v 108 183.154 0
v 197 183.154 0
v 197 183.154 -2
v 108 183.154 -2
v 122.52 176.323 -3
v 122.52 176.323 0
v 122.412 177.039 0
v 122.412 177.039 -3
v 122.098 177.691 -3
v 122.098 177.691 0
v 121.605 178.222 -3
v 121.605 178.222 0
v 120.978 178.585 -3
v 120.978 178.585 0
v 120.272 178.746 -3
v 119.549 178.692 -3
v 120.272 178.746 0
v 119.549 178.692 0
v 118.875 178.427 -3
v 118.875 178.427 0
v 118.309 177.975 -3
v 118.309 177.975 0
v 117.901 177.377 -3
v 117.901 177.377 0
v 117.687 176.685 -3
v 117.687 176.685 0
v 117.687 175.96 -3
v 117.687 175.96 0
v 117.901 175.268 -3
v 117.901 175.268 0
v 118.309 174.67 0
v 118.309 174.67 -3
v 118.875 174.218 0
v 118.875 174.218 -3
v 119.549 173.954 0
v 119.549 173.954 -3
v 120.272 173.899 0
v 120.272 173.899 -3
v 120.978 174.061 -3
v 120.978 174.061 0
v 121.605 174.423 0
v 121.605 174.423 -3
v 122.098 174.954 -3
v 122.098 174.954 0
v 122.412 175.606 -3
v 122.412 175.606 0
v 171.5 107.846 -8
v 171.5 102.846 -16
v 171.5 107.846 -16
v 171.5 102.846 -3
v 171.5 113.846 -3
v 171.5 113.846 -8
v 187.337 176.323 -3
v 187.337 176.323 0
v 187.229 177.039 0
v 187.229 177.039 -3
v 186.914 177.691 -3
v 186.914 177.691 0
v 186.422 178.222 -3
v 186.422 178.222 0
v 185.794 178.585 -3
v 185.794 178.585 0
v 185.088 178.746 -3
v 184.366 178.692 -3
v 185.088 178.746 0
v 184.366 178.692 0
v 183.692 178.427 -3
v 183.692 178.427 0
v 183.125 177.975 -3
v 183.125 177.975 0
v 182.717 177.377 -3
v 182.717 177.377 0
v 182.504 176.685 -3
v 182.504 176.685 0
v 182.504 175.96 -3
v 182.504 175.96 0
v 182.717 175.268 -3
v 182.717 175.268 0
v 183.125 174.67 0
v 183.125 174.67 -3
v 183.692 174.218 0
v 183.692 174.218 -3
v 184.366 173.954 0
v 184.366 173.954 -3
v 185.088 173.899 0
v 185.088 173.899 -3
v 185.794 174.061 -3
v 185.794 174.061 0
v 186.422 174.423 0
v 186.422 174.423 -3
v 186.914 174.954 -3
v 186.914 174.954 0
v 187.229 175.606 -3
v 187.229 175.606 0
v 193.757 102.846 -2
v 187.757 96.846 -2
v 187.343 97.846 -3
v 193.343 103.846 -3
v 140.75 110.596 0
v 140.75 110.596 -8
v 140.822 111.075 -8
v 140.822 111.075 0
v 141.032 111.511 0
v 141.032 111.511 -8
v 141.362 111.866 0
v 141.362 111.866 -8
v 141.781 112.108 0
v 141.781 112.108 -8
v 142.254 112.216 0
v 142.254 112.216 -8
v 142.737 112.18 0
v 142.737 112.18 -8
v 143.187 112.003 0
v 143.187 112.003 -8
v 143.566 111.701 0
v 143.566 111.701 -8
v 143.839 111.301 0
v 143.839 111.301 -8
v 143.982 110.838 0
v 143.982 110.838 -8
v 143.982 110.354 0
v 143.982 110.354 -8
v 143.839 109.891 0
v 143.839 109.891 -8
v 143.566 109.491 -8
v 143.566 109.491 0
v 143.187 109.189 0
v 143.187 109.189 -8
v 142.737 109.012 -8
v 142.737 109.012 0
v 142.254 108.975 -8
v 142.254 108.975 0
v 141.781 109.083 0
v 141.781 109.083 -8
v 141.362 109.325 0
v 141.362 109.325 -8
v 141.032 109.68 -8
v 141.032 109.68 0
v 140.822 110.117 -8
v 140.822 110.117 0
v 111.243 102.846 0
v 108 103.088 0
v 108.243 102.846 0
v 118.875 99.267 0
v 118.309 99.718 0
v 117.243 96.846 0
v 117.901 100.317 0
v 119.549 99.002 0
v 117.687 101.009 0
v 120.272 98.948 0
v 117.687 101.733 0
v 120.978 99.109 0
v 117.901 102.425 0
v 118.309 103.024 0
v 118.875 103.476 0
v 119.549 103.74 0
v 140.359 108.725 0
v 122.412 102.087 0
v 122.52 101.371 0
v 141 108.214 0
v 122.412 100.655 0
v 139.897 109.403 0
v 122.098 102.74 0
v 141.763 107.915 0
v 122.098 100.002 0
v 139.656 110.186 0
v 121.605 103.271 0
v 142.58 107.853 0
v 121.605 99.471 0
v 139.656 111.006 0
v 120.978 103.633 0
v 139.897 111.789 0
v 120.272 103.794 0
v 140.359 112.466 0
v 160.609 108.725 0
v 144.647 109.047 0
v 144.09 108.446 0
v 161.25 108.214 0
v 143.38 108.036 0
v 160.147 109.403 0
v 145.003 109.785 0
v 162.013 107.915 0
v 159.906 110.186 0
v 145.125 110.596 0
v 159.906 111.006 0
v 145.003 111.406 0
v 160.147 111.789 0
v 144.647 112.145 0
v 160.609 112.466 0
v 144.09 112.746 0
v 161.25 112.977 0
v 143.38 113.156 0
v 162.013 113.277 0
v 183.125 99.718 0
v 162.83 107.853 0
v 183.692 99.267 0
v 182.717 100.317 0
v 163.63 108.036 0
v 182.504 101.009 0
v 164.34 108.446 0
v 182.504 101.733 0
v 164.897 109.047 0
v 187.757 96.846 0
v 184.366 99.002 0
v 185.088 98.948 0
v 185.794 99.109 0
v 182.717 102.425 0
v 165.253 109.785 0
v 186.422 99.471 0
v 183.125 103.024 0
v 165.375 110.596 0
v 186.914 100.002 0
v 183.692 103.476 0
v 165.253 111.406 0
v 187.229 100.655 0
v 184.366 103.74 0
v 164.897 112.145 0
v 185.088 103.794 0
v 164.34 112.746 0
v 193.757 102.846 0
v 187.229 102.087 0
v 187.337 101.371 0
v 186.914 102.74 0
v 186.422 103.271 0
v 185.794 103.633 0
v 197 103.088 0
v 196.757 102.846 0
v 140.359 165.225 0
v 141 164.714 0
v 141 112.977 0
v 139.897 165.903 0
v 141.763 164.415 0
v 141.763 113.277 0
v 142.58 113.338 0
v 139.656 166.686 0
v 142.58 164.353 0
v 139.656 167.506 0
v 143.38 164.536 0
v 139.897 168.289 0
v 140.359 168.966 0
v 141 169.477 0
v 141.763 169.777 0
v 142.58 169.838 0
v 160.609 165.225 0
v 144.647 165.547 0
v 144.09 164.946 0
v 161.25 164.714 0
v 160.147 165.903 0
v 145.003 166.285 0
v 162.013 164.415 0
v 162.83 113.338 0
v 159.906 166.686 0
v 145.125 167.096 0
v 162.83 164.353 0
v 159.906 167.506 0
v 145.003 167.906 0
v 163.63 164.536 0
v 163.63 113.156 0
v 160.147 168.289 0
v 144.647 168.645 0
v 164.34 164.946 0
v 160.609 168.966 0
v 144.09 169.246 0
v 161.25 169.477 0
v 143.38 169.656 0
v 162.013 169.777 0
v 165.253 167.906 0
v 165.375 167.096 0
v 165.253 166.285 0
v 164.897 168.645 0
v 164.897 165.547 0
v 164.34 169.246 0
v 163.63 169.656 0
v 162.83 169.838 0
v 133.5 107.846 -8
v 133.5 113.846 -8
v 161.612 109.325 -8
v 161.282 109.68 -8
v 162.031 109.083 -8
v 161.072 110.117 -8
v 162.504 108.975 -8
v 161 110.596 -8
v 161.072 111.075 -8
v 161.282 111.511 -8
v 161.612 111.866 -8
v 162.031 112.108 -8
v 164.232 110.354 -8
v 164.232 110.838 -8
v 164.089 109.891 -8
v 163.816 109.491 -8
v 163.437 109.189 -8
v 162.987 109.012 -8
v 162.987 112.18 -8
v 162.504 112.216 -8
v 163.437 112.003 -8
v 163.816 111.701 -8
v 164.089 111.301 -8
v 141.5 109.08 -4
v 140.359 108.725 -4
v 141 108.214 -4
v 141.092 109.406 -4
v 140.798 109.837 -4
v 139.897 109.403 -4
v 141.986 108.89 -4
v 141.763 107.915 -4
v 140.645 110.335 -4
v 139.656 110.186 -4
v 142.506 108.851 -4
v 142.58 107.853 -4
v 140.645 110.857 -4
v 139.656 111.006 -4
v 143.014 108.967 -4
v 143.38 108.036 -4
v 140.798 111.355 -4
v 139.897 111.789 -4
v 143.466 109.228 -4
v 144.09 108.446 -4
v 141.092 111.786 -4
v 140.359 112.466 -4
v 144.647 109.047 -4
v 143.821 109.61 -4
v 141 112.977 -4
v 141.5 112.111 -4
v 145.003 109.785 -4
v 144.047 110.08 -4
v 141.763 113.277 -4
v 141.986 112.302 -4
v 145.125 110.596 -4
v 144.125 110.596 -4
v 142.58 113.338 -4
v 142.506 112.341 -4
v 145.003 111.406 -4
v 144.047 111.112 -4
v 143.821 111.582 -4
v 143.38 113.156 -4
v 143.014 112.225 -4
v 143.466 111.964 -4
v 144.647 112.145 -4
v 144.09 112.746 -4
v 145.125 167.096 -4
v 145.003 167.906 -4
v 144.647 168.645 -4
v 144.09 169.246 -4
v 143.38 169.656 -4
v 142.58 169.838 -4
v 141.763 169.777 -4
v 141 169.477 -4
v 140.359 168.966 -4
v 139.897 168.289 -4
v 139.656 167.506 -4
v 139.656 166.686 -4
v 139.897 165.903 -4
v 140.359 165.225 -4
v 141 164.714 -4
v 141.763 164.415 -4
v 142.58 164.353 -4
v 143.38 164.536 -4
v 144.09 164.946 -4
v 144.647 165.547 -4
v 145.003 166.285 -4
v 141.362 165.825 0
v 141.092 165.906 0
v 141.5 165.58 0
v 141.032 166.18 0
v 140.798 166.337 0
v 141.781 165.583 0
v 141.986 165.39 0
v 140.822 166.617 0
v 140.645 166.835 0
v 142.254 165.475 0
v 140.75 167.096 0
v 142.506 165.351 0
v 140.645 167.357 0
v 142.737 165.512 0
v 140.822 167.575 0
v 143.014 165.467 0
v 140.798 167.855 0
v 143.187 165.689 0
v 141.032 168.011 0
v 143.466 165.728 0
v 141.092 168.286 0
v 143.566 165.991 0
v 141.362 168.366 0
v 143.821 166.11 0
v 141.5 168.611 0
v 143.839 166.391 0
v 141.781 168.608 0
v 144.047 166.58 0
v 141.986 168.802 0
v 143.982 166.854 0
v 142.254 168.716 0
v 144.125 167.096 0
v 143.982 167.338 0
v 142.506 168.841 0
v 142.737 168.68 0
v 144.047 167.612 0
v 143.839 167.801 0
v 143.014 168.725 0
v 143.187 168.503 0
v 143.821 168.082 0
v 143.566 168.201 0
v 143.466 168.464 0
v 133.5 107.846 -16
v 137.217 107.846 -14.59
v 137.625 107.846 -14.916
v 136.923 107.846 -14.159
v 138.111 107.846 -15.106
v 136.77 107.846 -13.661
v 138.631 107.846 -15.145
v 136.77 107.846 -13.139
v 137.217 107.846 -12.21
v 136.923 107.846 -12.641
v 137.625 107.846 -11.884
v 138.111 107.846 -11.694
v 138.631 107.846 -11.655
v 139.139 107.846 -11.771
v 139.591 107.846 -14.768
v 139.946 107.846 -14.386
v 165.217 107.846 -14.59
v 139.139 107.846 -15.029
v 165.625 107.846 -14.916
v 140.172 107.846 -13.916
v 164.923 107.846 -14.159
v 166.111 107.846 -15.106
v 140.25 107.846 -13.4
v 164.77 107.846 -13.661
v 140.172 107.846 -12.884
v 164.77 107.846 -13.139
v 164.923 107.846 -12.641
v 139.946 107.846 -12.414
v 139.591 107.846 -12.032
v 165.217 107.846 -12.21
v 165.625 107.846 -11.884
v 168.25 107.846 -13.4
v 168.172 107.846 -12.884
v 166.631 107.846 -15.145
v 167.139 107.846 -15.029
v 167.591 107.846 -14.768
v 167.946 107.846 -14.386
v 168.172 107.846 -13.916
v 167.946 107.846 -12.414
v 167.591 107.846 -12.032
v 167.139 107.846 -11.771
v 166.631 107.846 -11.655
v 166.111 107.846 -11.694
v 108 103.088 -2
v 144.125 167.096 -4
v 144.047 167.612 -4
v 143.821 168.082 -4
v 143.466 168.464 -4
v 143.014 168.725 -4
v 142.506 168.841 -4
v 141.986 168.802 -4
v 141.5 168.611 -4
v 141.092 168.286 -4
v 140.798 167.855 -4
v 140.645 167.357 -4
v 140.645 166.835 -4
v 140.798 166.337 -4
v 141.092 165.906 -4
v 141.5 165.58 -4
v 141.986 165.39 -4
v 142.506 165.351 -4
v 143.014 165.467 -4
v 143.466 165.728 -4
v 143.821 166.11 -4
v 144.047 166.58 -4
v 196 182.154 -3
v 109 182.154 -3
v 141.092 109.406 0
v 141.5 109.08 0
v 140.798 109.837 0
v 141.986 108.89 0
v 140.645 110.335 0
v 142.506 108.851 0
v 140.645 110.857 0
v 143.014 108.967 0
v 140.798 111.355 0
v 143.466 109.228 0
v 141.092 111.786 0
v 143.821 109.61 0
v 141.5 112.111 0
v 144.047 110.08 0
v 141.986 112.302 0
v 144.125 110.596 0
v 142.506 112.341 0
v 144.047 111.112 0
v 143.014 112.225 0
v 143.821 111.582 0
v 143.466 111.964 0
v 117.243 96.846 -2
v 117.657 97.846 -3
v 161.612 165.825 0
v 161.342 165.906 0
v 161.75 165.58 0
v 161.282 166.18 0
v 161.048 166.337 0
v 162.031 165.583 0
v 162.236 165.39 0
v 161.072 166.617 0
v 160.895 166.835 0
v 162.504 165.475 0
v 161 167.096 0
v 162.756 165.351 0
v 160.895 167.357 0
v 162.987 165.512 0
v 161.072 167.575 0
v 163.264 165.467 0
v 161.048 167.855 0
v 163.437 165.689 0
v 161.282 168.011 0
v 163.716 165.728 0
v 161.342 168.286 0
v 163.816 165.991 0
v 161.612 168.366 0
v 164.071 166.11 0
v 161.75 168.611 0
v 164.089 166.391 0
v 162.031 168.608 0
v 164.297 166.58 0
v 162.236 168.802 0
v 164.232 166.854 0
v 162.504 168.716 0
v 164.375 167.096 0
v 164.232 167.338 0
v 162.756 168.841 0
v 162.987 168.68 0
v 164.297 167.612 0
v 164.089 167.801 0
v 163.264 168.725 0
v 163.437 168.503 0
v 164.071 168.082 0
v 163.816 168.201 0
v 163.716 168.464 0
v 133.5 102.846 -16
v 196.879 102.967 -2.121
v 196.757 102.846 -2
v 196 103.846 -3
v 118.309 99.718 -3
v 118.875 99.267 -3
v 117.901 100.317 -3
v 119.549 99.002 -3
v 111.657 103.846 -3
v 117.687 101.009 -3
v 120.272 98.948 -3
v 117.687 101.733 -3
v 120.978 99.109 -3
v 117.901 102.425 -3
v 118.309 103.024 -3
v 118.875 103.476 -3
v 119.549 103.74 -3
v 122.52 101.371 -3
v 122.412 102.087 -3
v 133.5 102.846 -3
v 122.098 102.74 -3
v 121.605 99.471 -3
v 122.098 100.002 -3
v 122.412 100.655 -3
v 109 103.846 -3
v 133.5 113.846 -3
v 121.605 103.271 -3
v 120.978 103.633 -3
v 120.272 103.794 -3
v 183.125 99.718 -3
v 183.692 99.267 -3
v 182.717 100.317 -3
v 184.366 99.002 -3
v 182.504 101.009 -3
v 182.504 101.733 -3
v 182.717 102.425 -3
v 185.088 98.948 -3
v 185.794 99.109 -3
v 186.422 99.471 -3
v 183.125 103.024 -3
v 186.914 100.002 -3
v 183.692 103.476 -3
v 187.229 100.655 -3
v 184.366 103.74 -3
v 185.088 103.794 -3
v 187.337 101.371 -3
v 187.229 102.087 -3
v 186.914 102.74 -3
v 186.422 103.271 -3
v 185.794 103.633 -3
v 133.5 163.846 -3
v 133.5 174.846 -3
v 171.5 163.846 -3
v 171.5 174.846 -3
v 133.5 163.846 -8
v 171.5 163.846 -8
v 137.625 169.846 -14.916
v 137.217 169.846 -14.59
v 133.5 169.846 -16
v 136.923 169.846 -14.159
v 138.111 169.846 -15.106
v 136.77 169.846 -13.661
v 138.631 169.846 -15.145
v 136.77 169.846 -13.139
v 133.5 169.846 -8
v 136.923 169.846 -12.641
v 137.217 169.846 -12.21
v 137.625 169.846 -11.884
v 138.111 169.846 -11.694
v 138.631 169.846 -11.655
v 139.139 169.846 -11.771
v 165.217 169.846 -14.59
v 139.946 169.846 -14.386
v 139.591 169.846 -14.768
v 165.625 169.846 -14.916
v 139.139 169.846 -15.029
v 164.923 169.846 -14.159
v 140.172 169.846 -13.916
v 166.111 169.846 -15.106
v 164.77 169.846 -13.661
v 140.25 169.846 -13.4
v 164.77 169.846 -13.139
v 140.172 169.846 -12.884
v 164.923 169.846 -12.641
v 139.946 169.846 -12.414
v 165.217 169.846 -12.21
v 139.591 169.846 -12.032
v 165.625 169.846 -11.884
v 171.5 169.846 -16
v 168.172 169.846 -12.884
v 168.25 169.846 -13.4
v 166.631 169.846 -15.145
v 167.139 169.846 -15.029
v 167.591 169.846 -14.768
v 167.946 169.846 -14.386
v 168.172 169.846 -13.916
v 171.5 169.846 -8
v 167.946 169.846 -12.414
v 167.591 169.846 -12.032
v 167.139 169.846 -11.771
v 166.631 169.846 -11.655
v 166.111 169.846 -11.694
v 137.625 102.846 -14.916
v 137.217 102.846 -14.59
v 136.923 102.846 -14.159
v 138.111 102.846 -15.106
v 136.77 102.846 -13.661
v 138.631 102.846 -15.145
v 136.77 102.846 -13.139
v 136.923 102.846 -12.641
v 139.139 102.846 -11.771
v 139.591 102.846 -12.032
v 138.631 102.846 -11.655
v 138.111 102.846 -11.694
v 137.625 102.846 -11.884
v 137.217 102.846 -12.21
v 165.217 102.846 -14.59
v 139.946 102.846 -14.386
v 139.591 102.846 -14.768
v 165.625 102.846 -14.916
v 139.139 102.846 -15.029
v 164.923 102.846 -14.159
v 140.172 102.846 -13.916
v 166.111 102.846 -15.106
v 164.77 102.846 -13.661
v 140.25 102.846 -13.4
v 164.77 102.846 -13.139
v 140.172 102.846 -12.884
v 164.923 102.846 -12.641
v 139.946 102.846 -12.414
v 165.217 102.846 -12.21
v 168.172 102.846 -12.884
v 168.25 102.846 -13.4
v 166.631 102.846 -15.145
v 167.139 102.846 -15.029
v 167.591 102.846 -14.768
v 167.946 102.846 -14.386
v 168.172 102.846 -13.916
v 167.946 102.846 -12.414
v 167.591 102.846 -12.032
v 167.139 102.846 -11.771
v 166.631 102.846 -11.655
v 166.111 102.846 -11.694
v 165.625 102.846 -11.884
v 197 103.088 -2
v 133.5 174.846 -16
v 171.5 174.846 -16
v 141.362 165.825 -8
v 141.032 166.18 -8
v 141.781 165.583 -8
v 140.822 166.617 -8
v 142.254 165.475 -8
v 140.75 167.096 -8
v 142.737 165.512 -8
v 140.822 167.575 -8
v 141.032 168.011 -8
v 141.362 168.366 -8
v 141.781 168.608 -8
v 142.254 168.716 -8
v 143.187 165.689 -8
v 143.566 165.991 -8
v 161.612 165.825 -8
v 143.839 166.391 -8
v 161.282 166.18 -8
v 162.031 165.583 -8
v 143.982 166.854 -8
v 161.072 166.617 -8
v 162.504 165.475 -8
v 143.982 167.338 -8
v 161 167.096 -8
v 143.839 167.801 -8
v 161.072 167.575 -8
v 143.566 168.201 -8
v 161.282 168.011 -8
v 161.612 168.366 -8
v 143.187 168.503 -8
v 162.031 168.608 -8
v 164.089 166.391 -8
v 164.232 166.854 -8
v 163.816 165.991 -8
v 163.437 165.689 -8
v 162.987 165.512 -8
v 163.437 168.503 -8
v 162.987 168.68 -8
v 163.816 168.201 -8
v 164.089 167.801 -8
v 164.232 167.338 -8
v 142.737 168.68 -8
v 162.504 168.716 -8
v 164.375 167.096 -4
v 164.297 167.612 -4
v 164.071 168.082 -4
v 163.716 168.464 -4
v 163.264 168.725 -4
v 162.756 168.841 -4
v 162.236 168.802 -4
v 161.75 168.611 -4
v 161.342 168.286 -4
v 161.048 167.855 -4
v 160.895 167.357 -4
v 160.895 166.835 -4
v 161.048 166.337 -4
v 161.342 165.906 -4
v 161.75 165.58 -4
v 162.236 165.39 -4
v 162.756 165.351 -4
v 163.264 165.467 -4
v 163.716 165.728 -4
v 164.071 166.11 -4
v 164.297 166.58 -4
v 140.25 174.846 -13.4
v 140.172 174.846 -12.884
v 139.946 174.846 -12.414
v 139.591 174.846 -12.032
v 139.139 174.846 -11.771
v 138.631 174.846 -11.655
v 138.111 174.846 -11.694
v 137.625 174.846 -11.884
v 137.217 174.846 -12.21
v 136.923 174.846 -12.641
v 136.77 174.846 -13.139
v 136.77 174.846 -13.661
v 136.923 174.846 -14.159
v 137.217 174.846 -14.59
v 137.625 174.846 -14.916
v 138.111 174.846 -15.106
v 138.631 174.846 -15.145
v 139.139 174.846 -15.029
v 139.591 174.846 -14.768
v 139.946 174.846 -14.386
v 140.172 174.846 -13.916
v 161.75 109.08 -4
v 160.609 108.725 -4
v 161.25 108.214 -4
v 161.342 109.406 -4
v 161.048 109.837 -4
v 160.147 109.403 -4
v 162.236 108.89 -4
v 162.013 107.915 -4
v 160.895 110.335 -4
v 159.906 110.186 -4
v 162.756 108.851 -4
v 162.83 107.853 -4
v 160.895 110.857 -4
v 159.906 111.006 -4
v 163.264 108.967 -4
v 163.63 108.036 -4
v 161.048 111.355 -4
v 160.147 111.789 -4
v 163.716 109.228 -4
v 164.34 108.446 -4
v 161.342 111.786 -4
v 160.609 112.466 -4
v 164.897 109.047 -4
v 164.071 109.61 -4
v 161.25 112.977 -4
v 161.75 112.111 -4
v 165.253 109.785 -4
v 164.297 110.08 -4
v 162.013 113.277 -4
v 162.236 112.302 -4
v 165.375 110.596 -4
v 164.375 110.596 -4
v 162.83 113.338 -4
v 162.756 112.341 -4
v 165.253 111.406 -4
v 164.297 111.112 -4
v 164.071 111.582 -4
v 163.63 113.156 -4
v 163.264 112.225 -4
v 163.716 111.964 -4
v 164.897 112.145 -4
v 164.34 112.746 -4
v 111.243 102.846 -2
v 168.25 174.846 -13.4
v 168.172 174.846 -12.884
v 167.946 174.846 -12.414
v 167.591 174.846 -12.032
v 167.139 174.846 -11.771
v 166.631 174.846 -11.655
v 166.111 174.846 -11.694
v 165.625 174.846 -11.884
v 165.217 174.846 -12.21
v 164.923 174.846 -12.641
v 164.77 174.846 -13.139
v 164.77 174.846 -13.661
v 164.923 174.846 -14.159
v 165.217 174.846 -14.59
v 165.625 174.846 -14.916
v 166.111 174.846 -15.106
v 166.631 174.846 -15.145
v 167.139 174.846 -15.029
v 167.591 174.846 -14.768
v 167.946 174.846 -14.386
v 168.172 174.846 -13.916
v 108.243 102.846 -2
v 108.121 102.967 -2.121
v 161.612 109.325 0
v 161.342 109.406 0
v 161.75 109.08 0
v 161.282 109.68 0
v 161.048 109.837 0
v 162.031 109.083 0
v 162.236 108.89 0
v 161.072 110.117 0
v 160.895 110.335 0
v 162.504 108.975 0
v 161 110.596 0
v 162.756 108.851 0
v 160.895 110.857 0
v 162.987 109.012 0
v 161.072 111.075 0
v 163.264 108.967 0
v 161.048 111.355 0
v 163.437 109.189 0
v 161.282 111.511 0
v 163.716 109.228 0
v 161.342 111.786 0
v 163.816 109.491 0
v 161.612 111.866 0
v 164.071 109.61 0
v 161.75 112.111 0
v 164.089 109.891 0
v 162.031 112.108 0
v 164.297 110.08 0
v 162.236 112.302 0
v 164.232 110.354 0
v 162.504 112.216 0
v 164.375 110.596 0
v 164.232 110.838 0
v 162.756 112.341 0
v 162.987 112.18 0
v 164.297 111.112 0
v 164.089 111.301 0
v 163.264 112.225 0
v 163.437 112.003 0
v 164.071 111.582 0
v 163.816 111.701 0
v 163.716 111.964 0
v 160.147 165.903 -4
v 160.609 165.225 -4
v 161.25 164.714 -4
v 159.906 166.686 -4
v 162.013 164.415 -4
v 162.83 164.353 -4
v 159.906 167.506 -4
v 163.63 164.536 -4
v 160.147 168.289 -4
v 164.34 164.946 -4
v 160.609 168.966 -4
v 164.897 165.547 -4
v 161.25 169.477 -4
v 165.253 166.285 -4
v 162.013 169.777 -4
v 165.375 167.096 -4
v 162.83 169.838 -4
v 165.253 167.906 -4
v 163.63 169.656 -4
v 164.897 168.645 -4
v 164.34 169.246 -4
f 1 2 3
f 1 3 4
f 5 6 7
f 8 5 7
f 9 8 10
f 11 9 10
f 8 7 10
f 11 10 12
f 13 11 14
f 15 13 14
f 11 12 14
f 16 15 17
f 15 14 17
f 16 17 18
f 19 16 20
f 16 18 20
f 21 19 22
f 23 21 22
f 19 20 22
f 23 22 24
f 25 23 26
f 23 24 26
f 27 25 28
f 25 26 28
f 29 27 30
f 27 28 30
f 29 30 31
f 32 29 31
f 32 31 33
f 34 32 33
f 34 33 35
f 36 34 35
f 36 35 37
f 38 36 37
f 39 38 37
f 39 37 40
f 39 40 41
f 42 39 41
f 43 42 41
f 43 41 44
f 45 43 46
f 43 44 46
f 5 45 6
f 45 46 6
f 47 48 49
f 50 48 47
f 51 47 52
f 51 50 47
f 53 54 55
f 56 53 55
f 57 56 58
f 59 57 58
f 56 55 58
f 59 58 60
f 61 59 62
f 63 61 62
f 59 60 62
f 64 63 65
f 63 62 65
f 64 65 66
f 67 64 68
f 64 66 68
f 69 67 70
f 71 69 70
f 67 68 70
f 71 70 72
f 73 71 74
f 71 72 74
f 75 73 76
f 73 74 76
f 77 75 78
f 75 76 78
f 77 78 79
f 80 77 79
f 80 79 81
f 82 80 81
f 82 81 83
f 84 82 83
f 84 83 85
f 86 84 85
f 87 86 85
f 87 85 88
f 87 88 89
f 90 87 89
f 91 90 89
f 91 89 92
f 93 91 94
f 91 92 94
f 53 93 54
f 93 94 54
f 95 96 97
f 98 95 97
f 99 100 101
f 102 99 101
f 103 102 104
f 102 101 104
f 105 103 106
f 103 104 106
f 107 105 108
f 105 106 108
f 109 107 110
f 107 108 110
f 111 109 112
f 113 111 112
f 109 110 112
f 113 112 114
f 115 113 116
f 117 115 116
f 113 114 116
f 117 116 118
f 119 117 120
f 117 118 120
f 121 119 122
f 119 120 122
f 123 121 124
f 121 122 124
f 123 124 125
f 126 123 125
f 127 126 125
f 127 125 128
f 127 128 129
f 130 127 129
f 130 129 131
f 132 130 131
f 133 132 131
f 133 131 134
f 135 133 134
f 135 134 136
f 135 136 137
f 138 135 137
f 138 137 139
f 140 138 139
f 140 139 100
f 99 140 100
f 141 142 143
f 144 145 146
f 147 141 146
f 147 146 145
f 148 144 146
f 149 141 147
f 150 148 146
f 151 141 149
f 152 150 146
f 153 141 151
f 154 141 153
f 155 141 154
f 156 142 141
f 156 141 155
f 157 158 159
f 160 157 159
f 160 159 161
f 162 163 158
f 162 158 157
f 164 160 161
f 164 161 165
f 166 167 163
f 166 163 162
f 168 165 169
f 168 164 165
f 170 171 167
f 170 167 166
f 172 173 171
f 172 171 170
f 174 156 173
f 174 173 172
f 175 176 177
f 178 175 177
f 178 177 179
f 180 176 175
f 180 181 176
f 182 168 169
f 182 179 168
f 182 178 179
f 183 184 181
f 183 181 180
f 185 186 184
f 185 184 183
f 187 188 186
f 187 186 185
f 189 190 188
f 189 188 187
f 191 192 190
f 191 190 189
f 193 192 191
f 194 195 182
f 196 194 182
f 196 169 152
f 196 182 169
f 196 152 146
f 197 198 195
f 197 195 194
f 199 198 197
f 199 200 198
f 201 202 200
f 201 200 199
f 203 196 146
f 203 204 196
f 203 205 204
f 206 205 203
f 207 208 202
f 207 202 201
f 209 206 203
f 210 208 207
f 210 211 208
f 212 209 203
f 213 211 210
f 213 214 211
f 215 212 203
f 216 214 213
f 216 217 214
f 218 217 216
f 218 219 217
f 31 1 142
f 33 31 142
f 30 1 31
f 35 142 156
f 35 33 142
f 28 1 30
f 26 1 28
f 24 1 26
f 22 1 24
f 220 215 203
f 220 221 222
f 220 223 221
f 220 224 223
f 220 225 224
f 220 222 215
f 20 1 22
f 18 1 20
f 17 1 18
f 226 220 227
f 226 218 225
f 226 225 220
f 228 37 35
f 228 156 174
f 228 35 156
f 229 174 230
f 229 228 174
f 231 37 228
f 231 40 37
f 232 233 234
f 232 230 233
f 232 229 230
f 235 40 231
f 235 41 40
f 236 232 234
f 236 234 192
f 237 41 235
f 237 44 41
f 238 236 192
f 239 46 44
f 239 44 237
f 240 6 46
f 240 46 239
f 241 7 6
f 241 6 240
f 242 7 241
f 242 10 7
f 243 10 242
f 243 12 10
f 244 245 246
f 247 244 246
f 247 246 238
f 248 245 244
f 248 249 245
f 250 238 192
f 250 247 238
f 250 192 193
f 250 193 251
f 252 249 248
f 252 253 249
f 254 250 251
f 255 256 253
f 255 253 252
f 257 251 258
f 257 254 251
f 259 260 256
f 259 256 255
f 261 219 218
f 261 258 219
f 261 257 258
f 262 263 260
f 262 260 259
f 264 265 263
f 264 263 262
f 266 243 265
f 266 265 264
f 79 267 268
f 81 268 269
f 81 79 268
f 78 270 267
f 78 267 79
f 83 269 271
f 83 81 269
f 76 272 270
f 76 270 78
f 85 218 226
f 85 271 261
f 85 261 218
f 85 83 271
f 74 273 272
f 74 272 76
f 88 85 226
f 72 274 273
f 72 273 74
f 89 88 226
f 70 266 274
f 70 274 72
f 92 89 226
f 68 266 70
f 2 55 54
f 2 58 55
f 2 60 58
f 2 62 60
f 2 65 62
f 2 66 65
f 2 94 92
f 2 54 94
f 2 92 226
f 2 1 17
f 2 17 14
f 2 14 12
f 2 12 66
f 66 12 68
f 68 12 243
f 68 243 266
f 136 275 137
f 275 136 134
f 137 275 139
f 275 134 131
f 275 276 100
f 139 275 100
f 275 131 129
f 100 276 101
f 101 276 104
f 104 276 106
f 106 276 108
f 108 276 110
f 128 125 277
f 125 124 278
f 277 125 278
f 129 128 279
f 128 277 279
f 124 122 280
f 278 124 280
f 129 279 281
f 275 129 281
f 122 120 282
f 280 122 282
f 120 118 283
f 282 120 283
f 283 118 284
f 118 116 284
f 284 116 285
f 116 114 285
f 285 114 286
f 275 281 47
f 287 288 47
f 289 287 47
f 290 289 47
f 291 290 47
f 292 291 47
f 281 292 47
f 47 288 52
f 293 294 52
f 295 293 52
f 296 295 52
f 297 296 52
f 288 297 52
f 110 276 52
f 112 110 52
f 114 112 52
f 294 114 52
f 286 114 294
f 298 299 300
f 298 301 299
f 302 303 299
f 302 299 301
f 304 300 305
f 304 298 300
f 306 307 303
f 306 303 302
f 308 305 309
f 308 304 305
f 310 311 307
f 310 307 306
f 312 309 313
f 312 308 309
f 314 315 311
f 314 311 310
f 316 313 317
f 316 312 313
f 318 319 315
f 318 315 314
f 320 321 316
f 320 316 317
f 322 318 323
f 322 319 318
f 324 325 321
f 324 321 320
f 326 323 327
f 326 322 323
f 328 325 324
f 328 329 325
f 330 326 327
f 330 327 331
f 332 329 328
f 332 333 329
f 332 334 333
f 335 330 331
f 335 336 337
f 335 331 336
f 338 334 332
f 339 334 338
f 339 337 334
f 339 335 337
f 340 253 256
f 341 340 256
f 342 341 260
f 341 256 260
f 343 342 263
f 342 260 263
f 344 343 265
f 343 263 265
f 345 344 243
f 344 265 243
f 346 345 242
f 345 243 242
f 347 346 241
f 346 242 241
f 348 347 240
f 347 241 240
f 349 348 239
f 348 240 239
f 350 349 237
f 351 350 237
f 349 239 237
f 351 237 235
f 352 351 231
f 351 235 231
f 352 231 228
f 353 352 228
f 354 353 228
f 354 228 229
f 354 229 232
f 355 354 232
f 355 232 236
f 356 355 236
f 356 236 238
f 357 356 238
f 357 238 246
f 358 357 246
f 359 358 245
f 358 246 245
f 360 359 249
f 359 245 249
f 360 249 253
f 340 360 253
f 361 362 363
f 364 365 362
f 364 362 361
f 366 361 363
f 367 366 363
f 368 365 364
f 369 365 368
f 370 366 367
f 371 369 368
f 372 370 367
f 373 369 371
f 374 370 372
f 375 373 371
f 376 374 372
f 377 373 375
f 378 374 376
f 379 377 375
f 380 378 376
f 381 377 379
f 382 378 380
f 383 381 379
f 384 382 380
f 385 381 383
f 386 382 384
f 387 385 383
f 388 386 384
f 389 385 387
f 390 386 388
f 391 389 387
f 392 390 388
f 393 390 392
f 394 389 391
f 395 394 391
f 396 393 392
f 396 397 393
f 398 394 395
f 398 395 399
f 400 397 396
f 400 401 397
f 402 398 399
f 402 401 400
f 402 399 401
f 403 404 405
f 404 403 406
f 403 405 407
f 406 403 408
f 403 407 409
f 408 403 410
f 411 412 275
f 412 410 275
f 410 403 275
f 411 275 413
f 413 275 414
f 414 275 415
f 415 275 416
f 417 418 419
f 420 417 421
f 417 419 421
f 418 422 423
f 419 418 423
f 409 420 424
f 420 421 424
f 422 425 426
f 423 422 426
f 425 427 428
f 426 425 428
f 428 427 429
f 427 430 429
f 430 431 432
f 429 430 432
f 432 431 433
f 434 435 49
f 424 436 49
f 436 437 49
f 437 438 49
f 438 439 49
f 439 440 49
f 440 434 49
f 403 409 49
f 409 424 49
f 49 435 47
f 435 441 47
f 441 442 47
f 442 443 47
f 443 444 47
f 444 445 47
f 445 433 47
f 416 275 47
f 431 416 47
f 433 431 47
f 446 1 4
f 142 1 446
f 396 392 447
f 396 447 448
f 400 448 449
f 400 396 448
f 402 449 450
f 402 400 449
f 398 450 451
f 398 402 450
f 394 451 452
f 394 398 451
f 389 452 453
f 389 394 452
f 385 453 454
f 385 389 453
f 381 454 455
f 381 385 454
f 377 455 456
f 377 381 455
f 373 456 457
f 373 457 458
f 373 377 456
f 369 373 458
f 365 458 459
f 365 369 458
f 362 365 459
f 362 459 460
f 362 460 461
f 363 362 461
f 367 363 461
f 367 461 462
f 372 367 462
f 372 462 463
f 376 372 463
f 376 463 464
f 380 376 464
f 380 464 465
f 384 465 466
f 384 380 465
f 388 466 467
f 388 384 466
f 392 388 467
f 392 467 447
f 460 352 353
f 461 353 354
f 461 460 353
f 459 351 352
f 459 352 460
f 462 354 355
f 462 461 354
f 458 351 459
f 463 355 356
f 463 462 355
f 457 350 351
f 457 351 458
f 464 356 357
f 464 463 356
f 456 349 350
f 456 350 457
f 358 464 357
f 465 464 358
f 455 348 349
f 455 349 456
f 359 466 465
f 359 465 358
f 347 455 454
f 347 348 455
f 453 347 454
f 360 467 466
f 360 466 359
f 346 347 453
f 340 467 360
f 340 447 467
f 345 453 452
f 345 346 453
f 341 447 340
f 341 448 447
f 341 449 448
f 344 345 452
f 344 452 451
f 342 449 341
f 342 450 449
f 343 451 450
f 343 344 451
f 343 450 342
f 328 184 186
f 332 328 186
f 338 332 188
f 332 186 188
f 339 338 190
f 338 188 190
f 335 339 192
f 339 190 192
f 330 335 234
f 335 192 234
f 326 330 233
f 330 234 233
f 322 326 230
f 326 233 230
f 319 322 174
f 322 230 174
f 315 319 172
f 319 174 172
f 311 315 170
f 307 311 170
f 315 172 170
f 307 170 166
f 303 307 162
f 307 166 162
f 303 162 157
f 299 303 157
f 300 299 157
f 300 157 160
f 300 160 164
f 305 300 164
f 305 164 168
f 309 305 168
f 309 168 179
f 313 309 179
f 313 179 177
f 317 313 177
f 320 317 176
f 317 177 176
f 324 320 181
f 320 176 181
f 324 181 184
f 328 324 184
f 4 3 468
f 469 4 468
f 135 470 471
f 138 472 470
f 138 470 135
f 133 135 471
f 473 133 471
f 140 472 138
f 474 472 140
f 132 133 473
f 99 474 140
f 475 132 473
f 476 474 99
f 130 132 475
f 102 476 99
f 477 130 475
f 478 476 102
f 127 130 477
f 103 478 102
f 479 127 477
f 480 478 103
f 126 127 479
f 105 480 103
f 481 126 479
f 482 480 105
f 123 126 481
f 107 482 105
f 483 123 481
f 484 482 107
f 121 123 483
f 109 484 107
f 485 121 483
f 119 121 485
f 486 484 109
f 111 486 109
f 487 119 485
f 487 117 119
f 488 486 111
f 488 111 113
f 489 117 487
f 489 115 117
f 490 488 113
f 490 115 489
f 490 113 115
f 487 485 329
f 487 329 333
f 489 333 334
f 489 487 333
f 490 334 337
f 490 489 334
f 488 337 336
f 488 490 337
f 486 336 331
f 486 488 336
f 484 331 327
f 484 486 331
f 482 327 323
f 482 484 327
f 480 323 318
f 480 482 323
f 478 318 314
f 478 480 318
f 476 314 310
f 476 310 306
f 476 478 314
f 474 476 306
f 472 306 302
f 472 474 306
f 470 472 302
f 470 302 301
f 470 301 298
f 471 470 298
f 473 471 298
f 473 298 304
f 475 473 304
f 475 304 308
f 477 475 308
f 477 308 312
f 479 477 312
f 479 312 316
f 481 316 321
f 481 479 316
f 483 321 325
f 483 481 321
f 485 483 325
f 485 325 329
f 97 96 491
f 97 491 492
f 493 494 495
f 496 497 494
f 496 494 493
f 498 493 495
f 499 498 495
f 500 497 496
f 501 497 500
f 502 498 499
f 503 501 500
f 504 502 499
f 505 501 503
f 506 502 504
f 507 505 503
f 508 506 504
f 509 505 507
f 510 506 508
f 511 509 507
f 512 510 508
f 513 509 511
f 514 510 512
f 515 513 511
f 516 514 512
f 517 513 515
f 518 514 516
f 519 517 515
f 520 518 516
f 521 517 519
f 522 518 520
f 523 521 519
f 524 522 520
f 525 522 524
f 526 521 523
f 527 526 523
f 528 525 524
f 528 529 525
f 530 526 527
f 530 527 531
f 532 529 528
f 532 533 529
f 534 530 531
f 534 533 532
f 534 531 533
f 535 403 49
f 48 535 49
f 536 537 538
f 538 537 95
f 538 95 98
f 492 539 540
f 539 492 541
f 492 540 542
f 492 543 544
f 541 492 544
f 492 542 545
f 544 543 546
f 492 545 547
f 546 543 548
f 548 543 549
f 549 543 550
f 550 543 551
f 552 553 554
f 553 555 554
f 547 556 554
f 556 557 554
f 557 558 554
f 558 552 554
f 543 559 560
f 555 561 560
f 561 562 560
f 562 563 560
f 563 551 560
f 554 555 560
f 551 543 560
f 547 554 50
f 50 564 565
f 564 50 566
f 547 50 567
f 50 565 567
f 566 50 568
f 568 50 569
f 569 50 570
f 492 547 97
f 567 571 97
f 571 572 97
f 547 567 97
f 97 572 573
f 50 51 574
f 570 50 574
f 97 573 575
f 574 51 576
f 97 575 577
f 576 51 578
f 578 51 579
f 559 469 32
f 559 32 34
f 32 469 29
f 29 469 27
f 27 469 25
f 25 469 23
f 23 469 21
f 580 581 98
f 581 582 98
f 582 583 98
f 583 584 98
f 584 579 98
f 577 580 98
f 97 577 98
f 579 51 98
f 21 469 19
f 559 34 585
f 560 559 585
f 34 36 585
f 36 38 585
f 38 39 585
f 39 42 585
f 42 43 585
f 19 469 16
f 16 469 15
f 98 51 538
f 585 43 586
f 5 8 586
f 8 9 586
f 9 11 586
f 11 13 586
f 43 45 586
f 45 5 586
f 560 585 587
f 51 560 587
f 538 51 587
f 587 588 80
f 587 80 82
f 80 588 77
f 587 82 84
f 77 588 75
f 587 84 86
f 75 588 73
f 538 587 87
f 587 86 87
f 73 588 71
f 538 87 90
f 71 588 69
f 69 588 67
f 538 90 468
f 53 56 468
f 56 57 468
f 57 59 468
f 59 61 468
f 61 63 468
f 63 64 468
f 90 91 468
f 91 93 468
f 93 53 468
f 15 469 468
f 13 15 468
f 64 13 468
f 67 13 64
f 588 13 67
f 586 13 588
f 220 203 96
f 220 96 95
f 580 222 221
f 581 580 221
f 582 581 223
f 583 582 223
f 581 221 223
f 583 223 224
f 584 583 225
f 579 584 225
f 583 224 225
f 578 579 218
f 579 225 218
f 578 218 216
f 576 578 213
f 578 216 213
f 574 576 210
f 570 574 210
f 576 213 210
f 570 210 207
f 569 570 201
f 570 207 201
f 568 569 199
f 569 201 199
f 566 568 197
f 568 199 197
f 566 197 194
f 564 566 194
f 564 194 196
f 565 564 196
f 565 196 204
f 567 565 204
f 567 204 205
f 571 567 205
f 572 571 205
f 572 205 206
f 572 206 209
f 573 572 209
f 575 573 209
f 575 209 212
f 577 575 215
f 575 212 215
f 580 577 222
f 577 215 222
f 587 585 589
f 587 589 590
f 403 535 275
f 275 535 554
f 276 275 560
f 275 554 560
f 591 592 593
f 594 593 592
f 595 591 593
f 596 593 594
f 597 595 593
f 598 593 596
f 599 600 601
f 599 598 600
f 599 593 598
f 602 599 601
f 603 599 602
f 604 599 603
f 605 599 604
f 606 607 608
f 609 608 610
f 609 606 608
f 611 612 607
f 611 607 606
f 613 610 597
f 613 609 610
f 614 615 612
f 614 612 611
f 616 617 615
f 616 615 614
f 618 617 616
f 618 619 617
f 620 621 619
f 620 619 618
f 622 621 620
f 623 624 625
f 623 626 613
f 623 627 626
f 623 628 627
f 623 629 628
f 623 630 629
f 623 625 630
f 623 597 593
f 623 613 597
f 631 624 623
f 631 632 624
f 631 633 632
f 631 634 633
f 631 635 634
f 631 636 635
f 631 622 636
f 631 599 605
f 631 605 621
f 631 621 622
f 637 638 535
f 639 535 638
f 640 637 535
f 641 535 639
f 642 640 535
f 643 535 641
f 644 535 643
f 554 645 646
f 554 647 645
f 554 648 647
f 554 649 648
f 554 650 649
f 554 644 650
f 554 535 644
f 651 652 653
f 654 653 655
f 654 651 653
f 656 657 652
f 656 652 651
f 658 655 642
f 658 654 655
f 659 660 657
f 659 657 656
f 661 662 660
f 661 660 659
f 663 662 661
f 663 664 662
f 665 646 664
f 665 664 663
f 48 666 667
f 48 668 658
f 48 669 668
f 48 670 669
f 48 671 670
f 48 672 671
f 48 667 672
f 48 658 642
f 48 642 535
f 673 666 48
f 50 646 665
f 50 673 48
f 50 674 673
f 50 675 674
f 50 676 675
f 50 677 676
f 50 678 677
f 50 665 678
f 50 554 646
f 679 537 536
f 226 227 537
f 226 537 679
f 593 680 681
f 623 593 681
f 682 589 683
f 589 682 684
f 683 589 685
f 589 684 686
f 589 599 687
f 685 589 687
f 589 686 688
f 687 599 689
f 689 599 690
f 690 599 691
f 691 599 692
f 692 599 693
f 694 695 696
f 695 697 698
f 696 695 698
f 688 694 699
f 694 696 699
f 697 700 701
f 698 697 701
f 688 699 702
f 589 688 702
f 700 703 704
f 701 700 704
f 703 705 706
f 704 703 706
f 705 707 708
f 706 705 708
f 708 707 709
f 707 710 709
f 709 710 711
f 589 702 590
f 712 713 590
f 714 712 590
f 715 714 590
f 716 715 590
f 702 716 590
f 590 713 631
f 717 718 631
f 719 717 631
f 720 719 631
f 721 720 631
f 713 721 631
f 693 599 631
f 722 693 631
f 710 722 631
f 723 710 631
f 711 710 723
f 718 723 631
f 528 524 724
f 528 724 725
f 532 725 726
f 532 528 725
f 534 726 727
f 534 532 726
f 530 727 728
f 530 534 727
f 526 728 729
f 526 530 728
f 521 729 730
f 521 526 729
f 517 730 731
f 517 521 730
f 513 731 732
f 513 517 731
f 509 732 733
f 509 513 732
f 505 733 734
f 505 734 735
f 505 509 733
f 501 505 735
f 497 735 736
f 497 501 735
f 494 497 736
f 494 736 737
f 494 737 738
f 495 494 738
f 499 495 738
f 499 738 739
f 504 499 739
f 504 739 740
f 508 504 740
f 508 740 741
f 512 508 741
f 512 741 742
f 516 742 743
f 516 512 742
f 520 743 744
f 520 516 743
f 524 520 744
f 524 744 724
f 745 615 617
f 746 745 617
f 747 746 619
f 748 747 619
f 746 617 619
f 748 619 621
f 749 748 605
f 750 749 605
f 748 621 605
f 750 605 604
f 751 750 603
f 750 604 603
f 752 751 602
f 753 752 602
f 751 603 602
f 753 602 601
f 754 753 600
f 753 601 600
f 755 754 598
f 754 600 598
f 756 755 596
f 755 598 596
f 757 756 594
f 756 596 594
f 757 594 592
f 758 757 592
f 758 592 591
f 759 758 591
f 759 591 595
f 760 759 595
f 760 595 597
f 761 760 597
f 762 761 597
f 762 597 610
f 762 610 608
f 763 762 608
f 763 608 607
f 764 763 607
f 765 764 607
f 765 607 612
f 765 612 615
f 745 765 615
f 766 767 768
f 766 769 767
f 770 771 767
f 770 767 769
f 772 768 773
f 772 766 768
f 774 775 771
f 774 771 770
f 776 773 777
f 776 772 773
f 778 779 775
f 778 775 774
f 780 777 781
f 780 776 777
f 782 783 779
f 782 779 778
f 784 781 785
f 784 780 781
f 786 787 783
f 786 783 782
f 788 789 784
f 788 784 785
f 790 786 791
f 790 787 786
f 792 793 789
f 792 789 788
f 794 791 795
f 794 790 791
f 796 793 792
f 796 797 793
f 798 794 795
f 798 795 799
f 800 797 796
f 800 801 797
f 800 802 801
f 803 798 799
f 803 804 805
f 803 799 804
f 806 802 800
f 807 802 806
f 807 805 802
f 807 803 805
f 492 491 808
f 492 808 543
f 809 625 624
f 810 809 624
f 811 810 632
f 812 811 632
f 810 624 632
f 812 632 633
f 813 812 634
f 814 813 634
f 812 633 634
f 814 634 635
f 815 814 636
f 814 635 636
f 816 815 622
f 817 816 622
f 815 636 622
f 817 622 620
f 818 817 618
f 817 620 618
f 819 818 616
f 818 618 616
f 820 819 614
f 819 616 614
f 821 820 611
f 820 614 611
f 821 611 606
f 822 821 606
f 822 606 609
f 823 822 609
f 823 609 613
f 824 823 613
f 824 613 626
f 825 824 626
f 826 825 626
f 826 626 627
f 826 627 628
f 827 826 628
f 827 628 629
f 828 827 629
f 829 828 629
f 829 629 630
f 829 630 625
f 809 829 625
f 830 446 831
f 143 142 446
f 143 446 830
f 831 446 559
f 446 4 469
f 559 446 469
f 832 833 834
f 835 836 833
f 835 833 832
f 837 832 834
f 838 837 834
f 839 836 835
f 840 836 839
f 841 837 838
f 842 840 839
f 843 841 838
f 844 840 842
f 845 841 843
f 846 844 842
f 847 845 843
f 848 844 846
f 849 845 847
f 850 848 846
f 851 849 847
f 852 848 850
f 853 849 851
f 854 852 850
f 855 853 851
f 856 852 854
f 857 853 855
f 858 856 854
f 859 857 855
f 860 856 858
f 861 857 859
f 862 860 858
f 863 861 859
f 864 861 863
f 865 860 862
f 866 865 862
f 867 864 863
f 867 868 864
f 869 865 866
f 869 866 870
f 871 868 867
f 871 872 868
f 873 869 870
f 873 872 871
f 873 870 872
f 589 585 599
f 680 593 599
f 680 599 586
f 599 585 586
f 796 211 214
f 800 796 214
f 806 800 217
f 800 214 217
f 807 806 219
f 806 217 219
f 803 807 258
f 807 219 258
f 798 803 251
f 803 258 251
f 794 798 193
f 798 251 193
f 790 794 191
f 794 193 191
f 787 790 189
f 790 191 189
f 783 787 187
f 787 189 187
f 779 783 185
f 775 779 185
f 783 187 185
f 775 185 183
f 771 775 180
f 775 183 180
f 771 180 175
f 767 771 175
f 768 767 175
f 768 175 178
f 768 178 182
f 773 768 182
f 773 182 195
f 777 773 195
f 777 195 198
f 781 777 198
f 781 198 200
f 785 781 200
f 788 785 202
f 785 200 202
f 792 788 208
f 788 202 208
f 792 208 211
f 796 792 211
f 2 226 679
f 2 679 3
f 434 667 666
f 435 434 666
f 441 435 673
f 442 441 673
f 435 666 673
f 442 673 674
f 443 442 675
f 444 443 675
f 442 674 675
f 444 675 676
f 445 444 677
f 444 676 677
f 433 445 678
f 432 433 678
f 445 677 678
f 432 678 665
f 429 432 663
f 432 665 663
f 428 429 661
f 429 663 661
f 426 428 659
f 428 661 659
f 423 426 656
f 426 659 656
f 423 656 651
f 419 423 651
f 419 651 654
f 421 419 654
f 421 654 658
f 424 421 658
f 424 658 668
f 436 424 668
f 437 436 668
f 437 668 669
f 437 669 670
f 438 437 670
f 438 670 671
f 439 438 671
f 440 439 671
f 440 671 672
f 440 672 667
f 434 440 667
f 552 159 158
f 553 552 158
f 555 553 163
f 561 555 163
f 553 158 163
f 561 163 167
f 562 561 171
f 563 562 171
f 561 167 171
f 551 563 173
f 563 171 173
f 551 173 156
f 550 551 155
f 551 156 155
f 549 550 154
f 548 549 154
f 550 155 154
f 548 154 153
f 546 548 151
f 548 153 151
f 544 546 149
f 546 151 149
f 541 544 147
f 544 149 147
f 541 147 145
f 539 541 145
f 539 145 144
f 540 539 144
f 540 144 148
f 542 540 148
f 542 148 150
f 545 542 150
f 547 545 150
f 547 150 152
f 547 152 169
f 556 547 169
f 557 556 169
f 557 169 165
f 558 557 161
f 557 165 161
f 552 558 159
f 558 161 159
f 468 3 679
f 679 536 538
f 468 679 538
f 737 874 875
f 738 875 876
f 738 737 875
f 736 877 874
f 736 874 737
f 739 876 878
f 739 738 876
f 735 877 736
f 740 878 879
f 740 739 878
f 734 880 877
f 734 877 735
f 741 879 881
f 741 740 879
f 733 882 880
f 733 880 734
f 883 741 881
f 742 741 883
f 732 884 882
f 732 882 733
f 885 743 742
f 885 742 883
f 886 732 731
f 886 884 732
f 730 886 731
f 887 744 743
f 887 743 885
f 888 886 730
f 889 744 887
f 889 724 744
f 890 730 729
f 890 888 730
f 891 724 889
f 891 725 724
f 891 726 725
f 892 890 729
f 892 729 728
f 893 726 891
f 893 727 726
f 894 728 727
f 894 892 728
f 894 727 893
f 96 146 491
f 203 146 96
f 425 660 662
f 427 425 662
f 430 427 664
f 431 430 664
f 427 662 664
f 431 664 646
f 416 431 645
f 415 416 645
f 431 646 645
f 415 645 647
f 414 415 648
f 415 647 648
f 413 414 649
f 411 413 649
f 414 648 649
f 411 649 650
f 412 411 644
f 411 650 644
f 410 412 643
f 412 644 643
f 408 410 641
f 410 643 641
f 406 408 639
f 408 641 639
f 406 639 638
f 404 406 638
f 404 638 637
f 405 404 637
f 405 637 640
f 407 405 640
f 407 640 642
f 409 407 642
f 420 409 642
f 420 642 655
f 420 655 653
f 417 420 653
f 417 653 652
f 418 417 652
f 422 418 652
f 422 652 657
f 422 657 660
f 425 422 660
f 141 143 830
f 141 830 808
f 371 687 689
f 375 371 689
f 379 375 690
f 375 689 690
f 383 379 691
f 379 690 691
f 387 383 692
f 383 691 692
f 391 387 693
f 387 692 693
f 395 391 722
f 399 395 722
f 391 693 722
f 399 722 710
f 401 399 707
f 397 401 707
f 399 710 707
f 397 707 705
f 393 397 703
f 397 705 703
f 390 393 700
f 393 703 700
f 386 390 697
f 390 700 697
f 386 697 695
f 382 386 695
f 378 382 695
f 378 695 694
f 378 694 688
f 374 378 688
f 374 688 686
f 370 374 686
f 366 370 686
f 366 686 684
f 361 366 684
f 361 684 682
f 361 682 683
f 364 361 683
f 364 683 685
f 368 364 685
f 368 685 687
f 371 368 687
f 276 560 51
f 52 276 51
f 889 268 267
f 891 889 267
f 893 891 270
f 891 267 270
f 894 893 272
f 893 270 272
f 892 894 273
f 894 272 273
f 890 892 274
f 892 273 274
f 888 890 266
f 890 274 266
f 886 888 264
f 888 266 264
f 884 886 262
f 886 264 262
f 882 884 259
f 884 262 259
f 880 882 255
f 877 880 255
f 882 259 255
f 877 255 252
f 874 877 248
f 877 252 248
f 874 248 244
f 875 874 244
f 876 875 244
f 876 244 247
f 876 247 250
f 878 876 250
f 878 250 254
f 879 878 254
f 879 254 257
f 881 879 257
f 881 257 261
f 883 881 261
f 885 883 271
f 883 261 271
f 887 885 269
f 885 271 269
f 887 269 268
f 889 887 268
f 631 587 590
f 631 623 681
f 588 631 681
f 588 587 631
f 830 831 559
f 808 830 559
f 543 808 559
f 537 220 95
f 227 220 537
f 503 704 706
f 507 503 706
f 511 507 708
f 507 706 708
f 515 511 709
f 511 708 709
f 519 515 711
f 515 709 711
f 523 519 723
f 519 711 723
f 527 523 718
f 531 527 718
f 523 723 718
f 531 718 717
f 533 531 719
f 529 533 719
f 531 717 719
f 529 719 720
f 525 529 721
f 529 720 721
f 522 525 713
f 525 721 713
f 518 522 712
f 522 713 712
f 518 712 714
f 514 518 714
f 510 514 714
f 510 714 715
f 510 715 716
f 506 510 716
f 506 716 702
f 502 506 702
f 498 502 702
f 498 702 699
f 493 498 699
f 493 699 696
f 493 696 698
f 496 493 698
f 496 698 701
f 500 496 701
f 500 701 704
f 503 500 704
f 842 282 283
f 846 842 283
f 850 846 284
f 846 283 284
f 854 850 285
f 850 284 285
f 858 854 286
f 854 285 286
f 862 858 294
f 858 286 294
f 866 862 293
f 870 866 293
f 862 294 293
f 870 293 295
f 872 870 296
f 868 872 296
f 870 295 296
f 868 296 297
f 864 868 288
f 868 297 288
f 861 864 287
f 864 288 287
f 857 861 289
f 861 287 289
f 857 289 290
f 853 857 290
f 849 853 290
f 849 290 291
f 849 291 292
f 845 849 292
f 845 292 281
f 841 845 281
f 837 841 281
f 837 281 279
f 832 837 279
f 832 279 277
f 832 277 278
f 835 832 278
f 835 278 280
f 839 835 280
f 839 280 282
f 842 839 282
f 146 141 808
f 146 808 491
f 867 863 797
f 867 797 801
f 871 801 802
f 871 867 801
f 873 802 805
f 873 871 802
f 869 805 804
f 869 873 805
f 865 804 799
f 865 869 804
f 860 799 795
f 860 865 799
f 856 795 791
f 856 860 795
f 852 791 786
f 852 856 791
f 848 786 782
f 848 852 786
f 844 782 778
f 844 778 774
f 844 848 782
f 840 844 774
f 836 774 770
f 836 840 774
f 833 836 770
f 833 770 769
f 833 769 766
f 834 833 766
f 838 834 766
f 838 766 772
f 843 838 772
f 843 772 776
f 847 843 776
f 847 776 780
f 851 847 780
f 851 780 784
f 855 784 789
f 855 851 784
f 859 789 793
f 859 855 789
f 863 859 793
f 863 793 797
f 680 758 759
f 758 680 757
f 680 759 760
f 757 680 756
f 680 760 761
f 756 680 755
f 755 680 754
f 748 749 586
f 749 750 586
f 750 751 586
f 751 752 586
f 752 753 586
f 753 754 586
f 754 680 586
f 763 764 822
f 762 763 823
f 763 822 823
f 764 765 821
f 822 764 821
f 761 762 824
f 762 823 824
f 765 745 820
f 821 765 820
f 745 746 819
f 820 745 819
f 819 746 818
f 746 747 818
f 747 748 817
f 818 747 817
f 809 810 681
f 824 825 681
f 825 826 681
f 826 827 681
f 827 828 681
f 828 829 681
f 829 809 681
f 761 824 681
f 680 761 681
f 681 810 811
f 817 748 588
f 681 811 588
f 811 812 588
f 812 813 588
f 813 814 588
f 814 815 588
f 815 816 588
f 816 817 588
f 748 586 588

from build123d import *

# Parameters (mm, degrees)
SKETCH3_W             = 38
SKETCH3_H             = 6
BOSS_EXTRUDE2_DEPTH   = 8
BOSS_EXTRUDE2_2_DEPTH = 8
SKETCH1_R             = 2.43
BOSS_EXTRUDE3_DEPTH   = 3
CHAMFER1_SIZE         = 1
SKETCH4_W             = 38
SKETCH4_H             = 5
BOSS_EXTRUDE4_DEPTH   = 16
SKETCH5_R             = 1.75
CUT_EXTRUDE1_DEPTH    = 80
SKETCH6_R             = 1.625
CUT_EXTRUDE2_DEPTH    = 10
SKETCH7_R             = 2.75
SKETCH7_R_2           = 1.75
CUT_EXTRUDE3_DEPTH    = 4


with BuildPart() as part:
    # Sketch3 → Boss-Extrude2 (new body)
    with BuildSketch(Plane.XY):
        with Locations((152.499981225, 110.845805079)):
            Rectangle(SKETCH3_W, SKETCH3_H)
    extrude(amount=-BOSS_EXTRUDE2_DEPTH)



with BuildPart() as body_2:
    # Sketch3 → Boss-Extrude2 2 (new body)
    with BuildSketch(Plane.XY):
        with Locations((152.499981225, 166.845805079)):
            Rectangle(SKETCH3_W, SKETCH3_H)
    extrude(amount=-BOSS_EXTRUDE2_2_DEPTH)


with BuildPart() as body_3:
    # Sketch1 → Boss-Extrude3 (new body)
    with BuildSketch(Plane.XY):
        Polygon((197.000000954, 103.088447924), (197.000000954, 183.154169798), (107.999998748, 183.154169798), (107.999998748, 103.08845101), (108.242627497, 102.845828652), (111.242642284, 102.845828652), (117.242639543, 96.845823944), (187.757360159, 96.845823944), (193.757357418, 102.845828652), (196.757376569, 102.845828652), align=None)
        with Locations((184.906666899, 176.322621726)):
            Circle(SKETCH1_R, mode=Mode.SUBTRACT)
        with Locations((120.09, 176.322621726)):
            Circle(SKETCH1_R, mode=Mode.SUBTRACT)
        with Locations((184.906666899, 101.371103796)):
            Circle(SKETCH1_R, mode=Mode.SUBTRACT)
        with Locations((120.09, 101.371103796)):
            Circle(SKETCH1_R, mode=Mode.SUBTRACT)
    extrude(amount=-BOSS_EXTRUDE3_DEPTH)

    # Chamfer1
    # the kernel refuses this chamfer: 1 mm, written as the material it takes off along each edge
    with BuildSketch(Plane(origin=(105.670944509, 102.845828652, -3), x_dir=(0, -0.027495876610582174, 0.9996219169112968), z_dir=(1, 0, 0))) as chamfer1_piece_1_section:
        Polygon((CHAMFER1_SIZE * 0.999621916911, -CHAMFER1_SIZE * 0.0274958766106), (-CHAMFER1_SIZE * 0.0274958766106, -CHAMFER1_SIZE * 0.999621916911), (0, 0), align=None)
    chamfer1_piece_1 = extrude(amount=8.143380763, mode=Mode.PRIVATE)
    chamfer1_piece_1 = split(chamfer1_piece_1, bisect_by=Plane(origin=(109.611460338, 104.477012624, -2.663729969), z_dir=(-0.7071072202160112, -0.7071063421568112, 0)), keep=Keep.TOP, mode=Mode.PRIVATE)
    add(chamfer1_piece_1, mode=Mode.SUBTRACT)
    with BuildSketch(Plane(origin=(109.424188934, 104.664284261, -3), x_dir=(-0.019442532877514053, -0.01944250873450663, 0.9996219169112968), z_dir=(0.7071063421568113, -0.7071072202160114, 0))) as chamfer1_piece_2_section:
        Polygon((CHAMFER1_SIZE * 0.999621916911, -CHAMFER1_SIZE * 0.0274958766106), (-CHAMFER1_SIZE * 0.0274958766106, -CHAMFER1_SIZE * 0.999621916911), (0, 0), align=None)
    chamfer1_piece_2 = extrude(amount=13.628648741, mode=Mode.PRIVATE)
    chamfer1_piece_2 = split(chamfer1_piece_2, bisect_by=Plane(origin=(115.495387611, 102.845828652, -2.667041635), z_dir=(0, -1, 0)), keep=Keep.TOP, mode=Mode.PRIVATE)
    add(chamfer1_piece_2, mode=Mode.SUBTRACT)
    with BuildSketch(Plane(origin=(191.18567443, 102.845828652, -3), x_dir=(0, -0.027495876610582174, 0.9996219169112968), z_dir=(1, 0, 0))) as chamfer1_piece_3_section:
        Polygon((CHAMFER1_SIZE * 0.999621916911, -CHAMFER1_SIZE * 0.0274958766106), (-CHAMFER1_SIZE * 0.0274958766106, -CHAMFER1_SIZE * 0.999621916911), (0, 0), align=None)
    chamfer1_piece_3 = extrude(amount=8.143385128, mode=Mode.PRIVATE)
    chamfer1_piece_3 = split(chamfer1_piece_3, bisect_by=Plane(origin=(195.388540462, 104.477013723, -2.663729975), z_dir=(0.7071072202160112, -0.7071063421568112, 0)), keep=Keep.TOP, mode=Mode.PRIVATE)
    add(chamfer1_piece_3, mode=Mode.SUBTRACT)
    with BuildSketch(Plane(origin=(185.938906809, 95.027368335, -3), x_dir=(0.019442532877507145, -0.019442508734499722, 0.999621916911297), z_dir=(0.7071063421568113, 0.7071072202160114, 0))) as chamfer1_piece_4_section:
        Polygon((CHAMFER1_SIZE * 0.999621916911, -CHAMFER1_SIZE * 0.0274958766106), (-CHAMFER1_SIZE * 0.0274958766106, -CHAMFER1_SIZE * 0.999621916911), (0, 0), align=None)
    chamfer1_piece_4 = extrude(amount=13.628648741, mode=Mode.PRIVATE)
    chamfer1_piece_4 = split(chamfer1_piece_4, bisect_by=Plane(origin=(189.504612091, 102.845828652, -2.667041635), z_dir=(0, -1, 0)), keep=Keep.TOP, mode=Mode.PRIVATE)
    add(chamfer1_piece_4, mode=Mode.SUBTRACT)
    with BuildSketch(Plane(origin=(114.670956555, 96.845823944, -3), x_dir=(0, -0.027495876610582174, 0.9996219169112968), z_dir=(1, 0, 0))) as chamfer1_piece_5:
        Polygon((CHAMFER1_SIZE * 0.999621916911, -CHAMFER1_SIZE * 0.0274958766106), (-CHAMFER1_SIZE * 0.0274958766106, -CHAMFER1_SIZE * 0.999621916911), (0, 0), align=None)
    extrude(amount=75.658086593, mode=Mode.SUBTRACT)
    with BuildSketch(Plane(origin=(107.999998748, 185.725852786, -3), x_dir=(-0.027495876610582174, 0, 0.9996219169112968), z_dir=(0, -1, 0))) as chamfer1_piece_6:
        Polygon((CHAMFER1_SIZE * 0.999621916911, -CHAMFER1_SIZE * 0.0274958766106), (-CHAMFER1_SIZE * 0.0274958766106, -CHAMFER1_SIZE * 0.999621916911), (0, 0), align=None)
    extrude(amount=85.209084764, mode=Mode.SUBTRACT)
    with BuildSketch(Plane(origin=(199.571683942, 183.154169798, -3), x_dir=(0, 0.027495876610582174, 0.9996219169112968), z_dir=(-1, 0, 0))) as chamfer1_piece_7:
        Polygon((CHAMFER1_SIZE * 0.999621916911, -CHAMFER1_SIZE * 0.0274958766106), (-CHAMFER1_SIZE * 0.0274958766106, -CHAMFER1_SIZE * 0.999621916911), (0, 0), align=None)
    extrude(amount=94.143368181, mode=Mode.SUBTRACT)
    with BuildSketch(Plane(origin=(197.000000954, 100.516764936, -3), x_dir=(0.027495876610582174, 0, 0.9996219169112968), z_dir=(0, 1, 0))) as chamfer1_piece_8:
        Polygon((CHAMFER1_SIZE * 0.999621916911, -CHAMFER1_SIZE * 0.0274958766106), (-CHAMFER1_SIZE * 0.0274958766106, -CHAMFER1_SIZE * 0.999621916911), (0, 0), align=None)
    extrude(amount=85.20908785, mode=Mode.SUBTRACT)
    with BuildSketch(Plane(origin=(105.670944509, 102.845828652, -3), x_dir=(0, -0.027495876610582174, 0.9996219169112968), z_dir=(1, 0, 0))) as chamfer1_piece_9a_section:
        Polygon((CHAMFER1_SIZE * 0.999621916911, -CHAMFER1_SIZE * 0.0274958766106), (-CHAMFER1_SIZE * 0.0274958766106, -CHAMFER1_SIZE * 0.999621916911), (0, 0), align=None)
    chamfer1_piece_9a = extrude(amount=8.143380763, mode=Mode.PRIVATE)
    chamfer1_piece_9a = split(chamfer1_piece_9a, bisect_by=Plane(origin=(111.621802536, 102.46666793, -2.681906862), z_dir=(0.7071072202160112, 0.7071063421568112, 0)), keep=Keep.TOP, mode=Mode.PRIVATE)
    with BuildSketch(Plane(origin=(109.424188934, 104.664284261, -3), x_dir=(-0.019442532877514053, -0.01944250873450663, 0.9996219169112968), z_dir=(0.7071063421568113, -0.7071072202160114, 0))) as chamfer1_piece_9b_section:
        Polygon((CHAMFER1_SIZE * 0.999621916911, -CHAMFER1_SIZE * 0.0274958766106), (-CHAMFER1_SIZE * 0.0274958766106, -CHAMFER1_SIZE * 0.999621916911), (0, 0), align=None)
    chamfer1_piece_9b = extrude(amount=13.628648741, mode=Mode.PRIVATE)
    chamfer1_piece_9b = split(chamfer1_piece_9b, bisect_by=Plane(origin=(110.706428382, 102.845828652, -2.681906862), z_dir=(0, 1, 0)), keep=Keep.TOP, mode=Mode.PRIVATE)
    chamfer1_piece_9 = chamfer1_piece_9a & chamfer1_piece_9b
    add(chamfer1_piece_9, mode=Mode.SUBTRACT)
    with BuildSketch(Plane(origin=(185.938906809, 95.027368335, -3), x_dir=(0.019442532877507145, -0.019442508734499722, 0.999621916911297), z_dir=(0.7071063421568113, 0.7071072202160114, 0))) as chamfer1_piece_10a_section:
        Polygon((CHAMFER1_SIZE * 0.999621916911, -CHAMFER1_SIZE * 0.0274958766106), (-CHAMFER1_SIZE * 0.0274958766106, -CHAMFER1_SIZE * 0.999621916911), (0, 0), align=None)
    chamfer1_piece_10a = extrude(amount=13.628648741, mode=Mode.PRIVATE)
    chamfer1_piece_10a = split(chamfer1_piece_10a, bisect_by=Plane(origin=(194.29357132, 102.845828652, -2.681906862), z_dir=(0, 1, 0)), keep=Keep.TOP, mode=Mode.PRIVATE)
    with BuildSketch(Plane(origin=(191.18567443, 102.845828652, -3), x_dir=(0, -0.027495876610582174, 0.9996219169112968), z_dir=(1, 0, 0))) as chamfer1_piece_10b_section:
        Polygon((CHAMFER1_SIZE * 0.999621916911, -CHAMFER1_SIZE * 0.0274958766106), (-CHAMFER1_SIZE * 0.0274958766106, -CHAMFER1_SIZE * 0.999621916911), (0, 0), align=None)
    chamfer1_piece_10b = extrude(amount=8.143385128, mode=Mode.PRIVATE)
    chamfer1_piece_10b = split(chamfer1_piece_10b, bisect_by=Plane(origin=(193.378197166, 102.46666793, -2.681906862), z_dir=(-0.7071072202160112, 0.7071063421568112, 0)), keep=Keep.TOP, mode=Mode.PRIVATE)
    chamfer1_piece_10 = chamfer1_piece_10a & chamfer1_piece_10b
    add(chamfer1_piece_10, mode=Mode.SUBTRACT)


with BuildPart() as part_1:
    add(part.part)

    add(body_2.part)  # Boss-Extrude4 merges body 2

    add(body_3.part)  # Boss-Extrude4 merges body 3
    # Sketch4 → Boss-Extrude4 (add)
    with BuildSketch(Plane.XY):
        with Locations((152.499981225, 172.345805079)):
            Rectangle(SKETCH4_W, SKETCH4_H)
        with Locations((152.499981225, 105.345805079)):
            Rectangle(SKETCH4_W, SKETCH4_H)
    extrude(amount=-BOSS_EXTRUDE4_DEPTH)

    # Sketch5 → Cut-Extrude1 (cut)
    with BuildSketch(Plane(origin=(0, 102.845805079, 0), x_dir=(-1, 0, 0), z_dir=(0, -1, 0))):
        with Locations(Location((-166.499981225, 13.4, 0), (0, 0, 180))):
            Circle(SKETCH5_R)
        with Locations(Location((-138.499981225, 13.4, 0), (0, 0, 180))):
            Circle(SKETCH5_R)
    extrude(amount=-CUT_EXTRUDE1_DEPTH, mode=Mode.SUBTRACT)

    # Sketch6 → Cut-Extrude2 (cut)
    with BuildSketch(Plane(origin=(0, 0, -8), x_dir=(-1, 0, 0), z_dir=(0, 0, -1))):
        with Locations((-162.624981225, 110.595805079)):
            Circle(SKETCH6_R)
        with Locations((-142.374981225, 110.595805079)):
            Circle(SKETCH6_R)
        with Locations((-162.624981225, 167.095805079)):
            Circle(SKETCH6_R)
        with Locations((-142.374981225, 167.095805079)):
            Circle(SKETCH6_R)
    extrude(amount=-CUT_EXTRUDE2_DEPTH, mode=Mode.SUBTRACT)

    # Sketch7 → Cut-Extrude3 (cut)
    # profile 1 of 4: a face of its own
    with BuildSketch(Plane.XY):
        with Locations((162.624981225, 167.095805079)):
            Circle(SKETCH7_R)
        with Locations((162.624981225, 167.095805079)):
            Circle(SKETCH7_R_2, mode=Mode.SUBTRACT)
    # profile 2 of 4: a face of its own
    with BuildSketch(Plane.XY):
        with Locations((142.374981225, 167.095805079)):
            Circle(SKETCH7_R)
        with Locations((142.374981225, 167.095805079)):
            Circle(SKETCH7_R_2, mode=Mode.SUBTRACT)
    # profile 3 of 4: a face of its own
    with BuildSketch(Plane.XY):
        with Locations((162.624981225, 110.595805079)):
            Circle(SKETCH7_R)
        with Locations((162.624981225, 110.595805079)):
            Circle(SKETCH7_R_2, mode=Mode.SUBTRACT)
    # profile 4 of 4: a face of its own
    with BuildSketch(Plane.XY):
        with Locations((142.374981225, 110.595805079)):
            Circle(SKETCH7_R)
        with Locations((142.374981225, 110.595805079)):
            Circle(SKETCH7_R_2, mode=Mode.SUBTRACT)
    extrude(amount=-CUT_EXTRUDE3_DEPTH, mode=Mode.SUBTRACT)


solid = part_1.part
